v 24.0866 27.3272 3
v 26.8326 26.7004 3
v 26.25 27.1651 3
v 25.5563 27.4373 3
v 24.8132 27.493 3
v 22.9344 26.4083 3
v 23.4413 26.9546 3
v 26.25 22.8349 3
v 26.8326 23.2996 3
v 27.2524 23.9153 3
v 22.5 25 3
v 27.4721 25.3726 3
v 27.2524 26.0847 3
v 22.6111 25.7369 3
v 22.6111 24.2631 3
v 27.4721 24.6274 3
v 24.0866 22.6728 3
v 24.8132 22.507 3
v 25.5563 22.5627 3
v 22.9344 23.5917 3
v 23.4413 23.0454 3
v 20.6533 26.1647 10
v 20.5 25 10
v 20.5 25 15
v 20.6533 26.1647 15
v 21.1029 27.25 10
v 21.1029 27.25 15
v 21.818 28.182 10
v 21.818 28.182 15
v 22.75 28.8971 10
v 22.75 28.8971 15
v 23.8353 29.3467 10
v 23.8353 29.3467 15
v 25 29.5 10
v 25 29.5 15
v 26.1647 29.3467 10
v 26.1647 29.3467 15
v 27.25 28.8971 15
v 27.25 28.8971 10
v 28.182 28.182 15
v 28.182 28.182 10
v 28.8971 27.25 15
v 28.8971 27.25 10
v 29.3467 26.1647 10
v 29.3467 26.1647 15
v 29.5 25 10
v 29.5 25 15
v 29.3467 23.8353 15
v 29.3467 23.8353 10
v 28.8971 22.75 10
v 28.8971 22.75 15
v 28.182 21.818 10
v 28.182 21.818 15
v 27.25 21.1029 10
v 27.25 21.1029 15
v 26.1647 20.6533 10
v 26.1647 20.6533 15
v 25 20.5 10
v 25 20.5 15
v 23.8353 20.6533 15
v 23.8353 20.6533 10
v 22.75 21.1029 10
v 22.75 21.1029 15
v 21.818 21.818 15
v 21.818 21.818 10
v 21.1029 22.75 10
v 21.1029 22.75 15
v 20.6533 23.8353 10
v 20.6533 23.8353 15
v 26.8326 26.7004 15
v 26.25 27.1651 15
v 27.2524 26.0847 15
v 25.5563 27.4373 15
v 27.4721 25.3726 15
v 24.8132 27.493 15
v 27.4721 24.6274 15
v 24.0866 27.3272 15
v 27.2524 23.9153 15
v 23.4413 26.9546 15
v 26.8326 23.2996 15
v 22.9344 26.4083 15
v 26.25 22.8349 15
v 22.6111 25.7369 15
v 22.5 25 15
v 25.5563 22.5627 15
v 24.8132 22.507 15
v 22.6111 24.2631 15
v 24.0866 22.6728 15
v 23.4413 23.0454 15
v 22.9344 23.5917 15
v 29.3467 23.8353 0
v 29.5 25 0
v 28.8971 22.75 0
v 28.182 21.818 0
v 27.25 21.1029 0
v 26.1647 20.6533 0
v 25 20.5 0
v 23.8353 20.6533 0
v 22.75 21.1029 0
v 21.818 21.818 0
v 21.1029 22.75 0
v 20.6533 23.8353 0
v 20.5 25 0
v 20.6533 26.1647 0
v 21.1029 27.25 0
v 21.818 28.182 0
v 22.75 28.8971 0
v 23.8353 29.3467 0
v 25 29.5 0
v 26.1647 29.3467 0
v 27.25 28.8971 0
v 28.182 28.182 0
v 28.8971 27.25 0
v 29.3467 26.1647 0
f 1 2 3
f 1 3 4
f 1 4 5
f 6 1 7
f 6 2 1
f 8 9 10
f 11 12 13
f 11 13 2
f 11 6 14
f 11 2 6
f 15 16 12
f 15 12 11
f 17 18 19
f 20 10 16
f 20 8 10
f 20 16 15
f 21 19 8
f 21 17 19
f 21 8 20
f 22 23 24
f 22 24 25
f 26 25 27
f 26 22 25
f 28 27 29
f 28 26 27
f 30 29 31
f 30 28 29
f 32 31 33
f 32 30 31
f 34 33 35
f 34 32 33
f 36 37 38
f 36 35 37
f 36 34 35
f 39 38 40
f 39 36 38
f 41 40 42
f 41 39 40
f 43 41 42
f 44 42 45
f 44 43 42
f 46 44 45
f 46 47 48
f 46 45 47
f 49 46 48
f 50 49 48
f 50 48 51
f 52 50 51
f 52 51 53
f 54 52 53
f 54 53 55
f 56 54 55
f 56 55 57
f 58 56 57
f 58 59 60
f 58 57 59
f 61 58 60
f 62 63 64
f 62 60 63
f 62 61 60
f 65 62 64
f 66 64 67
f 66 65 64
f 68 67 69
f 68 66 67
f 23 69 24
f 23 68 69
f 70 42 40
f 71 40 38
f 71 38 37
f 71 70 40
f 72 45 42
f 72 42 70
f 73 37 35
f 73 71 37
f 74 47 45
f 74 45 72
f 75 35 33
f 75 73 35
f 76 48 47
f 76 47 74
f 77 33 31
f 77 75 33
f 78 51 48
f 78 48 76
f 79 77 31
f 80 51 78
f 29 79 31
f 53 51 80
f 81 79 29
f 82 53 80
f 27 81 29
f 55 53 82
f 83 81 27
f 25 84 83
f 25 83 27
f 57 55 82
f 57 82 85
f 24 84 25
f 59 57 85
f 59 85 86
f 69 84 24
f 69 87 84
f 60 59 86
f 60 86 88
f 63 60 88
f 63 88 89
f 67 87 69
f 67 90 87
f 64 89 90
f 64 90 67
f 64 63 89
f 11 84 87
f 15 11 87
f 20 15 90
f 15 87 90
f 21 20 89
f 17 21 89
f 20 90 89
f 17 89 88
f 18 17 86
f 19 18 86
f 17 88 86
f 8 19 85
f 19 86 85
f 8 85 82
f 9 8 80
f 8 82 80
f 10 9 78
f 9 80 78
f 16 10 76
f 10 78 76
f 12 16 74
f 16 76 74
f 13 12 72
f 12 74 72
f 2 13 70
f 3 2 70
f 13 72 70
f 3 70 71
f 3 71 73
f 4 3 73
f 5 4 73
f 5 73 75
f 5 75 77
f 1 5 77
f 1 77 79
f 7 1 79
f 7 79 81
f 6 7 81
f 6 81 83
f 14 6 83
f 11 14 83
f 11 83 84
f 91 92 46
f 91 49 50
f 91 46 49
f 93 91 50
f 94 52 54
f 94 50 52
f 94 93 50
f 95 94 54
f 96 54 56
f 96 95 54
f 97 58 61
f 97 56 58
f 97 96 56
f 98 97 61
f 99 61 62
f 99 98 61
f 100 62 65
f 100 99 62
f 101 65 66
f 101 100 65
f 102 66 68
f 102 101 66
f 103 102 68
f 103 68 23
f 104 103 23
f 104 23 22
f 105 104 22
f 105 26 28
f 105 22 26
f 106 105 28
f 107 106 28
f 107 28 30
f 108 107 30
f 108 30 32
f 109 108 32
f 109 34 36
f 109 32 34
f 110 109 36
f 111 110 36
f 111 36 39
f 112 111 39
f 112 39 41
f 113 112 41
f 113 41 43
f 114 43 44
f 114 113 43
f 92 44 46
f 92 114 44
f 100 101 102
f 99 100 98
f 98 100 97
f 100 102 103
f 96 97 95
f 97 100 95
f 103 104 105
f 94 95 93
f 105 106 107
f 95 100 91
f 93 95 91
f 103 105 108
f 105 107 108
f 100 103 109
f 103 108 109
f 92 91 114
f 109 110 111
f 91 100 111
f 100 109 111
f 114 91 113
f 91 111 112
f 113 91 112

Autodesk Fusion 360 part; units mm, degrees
sketch "Sketch1" plane through (0, 0, 0) normal (0, 0, 1) x (1, 0, 0)
  circle A0 centre (25, 25) radius 2.5
  circle A1 centre (25, 25) radius 4.5
  dimension "d1" = 5
  dimension "d2" = 9
extrude "Extrude1" add sketch "Sketch1" along normal blind 10 contours A0 | A1
sketch "Sketch2" plane through (0, 0, 10) normal (0, 0, 1) x (-1, 0, 0)
  circle A0 centre (-25, -25) radius 4.5
extrude "Extrude2" add sketch "Sketch2" along normal blind 5
sketch "Sketch3" plane through (0, 0, 15) normal (0, 0, 1) x (-1, 0, 0)
  circle A0 centre (-25, -25) radius 4.5
  circle A1 centre (-25, -25) radius 2.5
  dimension "d7" = 5
extrude "Extrude3" cut sketch "Sketch3" against normal blind 12 contours A1
